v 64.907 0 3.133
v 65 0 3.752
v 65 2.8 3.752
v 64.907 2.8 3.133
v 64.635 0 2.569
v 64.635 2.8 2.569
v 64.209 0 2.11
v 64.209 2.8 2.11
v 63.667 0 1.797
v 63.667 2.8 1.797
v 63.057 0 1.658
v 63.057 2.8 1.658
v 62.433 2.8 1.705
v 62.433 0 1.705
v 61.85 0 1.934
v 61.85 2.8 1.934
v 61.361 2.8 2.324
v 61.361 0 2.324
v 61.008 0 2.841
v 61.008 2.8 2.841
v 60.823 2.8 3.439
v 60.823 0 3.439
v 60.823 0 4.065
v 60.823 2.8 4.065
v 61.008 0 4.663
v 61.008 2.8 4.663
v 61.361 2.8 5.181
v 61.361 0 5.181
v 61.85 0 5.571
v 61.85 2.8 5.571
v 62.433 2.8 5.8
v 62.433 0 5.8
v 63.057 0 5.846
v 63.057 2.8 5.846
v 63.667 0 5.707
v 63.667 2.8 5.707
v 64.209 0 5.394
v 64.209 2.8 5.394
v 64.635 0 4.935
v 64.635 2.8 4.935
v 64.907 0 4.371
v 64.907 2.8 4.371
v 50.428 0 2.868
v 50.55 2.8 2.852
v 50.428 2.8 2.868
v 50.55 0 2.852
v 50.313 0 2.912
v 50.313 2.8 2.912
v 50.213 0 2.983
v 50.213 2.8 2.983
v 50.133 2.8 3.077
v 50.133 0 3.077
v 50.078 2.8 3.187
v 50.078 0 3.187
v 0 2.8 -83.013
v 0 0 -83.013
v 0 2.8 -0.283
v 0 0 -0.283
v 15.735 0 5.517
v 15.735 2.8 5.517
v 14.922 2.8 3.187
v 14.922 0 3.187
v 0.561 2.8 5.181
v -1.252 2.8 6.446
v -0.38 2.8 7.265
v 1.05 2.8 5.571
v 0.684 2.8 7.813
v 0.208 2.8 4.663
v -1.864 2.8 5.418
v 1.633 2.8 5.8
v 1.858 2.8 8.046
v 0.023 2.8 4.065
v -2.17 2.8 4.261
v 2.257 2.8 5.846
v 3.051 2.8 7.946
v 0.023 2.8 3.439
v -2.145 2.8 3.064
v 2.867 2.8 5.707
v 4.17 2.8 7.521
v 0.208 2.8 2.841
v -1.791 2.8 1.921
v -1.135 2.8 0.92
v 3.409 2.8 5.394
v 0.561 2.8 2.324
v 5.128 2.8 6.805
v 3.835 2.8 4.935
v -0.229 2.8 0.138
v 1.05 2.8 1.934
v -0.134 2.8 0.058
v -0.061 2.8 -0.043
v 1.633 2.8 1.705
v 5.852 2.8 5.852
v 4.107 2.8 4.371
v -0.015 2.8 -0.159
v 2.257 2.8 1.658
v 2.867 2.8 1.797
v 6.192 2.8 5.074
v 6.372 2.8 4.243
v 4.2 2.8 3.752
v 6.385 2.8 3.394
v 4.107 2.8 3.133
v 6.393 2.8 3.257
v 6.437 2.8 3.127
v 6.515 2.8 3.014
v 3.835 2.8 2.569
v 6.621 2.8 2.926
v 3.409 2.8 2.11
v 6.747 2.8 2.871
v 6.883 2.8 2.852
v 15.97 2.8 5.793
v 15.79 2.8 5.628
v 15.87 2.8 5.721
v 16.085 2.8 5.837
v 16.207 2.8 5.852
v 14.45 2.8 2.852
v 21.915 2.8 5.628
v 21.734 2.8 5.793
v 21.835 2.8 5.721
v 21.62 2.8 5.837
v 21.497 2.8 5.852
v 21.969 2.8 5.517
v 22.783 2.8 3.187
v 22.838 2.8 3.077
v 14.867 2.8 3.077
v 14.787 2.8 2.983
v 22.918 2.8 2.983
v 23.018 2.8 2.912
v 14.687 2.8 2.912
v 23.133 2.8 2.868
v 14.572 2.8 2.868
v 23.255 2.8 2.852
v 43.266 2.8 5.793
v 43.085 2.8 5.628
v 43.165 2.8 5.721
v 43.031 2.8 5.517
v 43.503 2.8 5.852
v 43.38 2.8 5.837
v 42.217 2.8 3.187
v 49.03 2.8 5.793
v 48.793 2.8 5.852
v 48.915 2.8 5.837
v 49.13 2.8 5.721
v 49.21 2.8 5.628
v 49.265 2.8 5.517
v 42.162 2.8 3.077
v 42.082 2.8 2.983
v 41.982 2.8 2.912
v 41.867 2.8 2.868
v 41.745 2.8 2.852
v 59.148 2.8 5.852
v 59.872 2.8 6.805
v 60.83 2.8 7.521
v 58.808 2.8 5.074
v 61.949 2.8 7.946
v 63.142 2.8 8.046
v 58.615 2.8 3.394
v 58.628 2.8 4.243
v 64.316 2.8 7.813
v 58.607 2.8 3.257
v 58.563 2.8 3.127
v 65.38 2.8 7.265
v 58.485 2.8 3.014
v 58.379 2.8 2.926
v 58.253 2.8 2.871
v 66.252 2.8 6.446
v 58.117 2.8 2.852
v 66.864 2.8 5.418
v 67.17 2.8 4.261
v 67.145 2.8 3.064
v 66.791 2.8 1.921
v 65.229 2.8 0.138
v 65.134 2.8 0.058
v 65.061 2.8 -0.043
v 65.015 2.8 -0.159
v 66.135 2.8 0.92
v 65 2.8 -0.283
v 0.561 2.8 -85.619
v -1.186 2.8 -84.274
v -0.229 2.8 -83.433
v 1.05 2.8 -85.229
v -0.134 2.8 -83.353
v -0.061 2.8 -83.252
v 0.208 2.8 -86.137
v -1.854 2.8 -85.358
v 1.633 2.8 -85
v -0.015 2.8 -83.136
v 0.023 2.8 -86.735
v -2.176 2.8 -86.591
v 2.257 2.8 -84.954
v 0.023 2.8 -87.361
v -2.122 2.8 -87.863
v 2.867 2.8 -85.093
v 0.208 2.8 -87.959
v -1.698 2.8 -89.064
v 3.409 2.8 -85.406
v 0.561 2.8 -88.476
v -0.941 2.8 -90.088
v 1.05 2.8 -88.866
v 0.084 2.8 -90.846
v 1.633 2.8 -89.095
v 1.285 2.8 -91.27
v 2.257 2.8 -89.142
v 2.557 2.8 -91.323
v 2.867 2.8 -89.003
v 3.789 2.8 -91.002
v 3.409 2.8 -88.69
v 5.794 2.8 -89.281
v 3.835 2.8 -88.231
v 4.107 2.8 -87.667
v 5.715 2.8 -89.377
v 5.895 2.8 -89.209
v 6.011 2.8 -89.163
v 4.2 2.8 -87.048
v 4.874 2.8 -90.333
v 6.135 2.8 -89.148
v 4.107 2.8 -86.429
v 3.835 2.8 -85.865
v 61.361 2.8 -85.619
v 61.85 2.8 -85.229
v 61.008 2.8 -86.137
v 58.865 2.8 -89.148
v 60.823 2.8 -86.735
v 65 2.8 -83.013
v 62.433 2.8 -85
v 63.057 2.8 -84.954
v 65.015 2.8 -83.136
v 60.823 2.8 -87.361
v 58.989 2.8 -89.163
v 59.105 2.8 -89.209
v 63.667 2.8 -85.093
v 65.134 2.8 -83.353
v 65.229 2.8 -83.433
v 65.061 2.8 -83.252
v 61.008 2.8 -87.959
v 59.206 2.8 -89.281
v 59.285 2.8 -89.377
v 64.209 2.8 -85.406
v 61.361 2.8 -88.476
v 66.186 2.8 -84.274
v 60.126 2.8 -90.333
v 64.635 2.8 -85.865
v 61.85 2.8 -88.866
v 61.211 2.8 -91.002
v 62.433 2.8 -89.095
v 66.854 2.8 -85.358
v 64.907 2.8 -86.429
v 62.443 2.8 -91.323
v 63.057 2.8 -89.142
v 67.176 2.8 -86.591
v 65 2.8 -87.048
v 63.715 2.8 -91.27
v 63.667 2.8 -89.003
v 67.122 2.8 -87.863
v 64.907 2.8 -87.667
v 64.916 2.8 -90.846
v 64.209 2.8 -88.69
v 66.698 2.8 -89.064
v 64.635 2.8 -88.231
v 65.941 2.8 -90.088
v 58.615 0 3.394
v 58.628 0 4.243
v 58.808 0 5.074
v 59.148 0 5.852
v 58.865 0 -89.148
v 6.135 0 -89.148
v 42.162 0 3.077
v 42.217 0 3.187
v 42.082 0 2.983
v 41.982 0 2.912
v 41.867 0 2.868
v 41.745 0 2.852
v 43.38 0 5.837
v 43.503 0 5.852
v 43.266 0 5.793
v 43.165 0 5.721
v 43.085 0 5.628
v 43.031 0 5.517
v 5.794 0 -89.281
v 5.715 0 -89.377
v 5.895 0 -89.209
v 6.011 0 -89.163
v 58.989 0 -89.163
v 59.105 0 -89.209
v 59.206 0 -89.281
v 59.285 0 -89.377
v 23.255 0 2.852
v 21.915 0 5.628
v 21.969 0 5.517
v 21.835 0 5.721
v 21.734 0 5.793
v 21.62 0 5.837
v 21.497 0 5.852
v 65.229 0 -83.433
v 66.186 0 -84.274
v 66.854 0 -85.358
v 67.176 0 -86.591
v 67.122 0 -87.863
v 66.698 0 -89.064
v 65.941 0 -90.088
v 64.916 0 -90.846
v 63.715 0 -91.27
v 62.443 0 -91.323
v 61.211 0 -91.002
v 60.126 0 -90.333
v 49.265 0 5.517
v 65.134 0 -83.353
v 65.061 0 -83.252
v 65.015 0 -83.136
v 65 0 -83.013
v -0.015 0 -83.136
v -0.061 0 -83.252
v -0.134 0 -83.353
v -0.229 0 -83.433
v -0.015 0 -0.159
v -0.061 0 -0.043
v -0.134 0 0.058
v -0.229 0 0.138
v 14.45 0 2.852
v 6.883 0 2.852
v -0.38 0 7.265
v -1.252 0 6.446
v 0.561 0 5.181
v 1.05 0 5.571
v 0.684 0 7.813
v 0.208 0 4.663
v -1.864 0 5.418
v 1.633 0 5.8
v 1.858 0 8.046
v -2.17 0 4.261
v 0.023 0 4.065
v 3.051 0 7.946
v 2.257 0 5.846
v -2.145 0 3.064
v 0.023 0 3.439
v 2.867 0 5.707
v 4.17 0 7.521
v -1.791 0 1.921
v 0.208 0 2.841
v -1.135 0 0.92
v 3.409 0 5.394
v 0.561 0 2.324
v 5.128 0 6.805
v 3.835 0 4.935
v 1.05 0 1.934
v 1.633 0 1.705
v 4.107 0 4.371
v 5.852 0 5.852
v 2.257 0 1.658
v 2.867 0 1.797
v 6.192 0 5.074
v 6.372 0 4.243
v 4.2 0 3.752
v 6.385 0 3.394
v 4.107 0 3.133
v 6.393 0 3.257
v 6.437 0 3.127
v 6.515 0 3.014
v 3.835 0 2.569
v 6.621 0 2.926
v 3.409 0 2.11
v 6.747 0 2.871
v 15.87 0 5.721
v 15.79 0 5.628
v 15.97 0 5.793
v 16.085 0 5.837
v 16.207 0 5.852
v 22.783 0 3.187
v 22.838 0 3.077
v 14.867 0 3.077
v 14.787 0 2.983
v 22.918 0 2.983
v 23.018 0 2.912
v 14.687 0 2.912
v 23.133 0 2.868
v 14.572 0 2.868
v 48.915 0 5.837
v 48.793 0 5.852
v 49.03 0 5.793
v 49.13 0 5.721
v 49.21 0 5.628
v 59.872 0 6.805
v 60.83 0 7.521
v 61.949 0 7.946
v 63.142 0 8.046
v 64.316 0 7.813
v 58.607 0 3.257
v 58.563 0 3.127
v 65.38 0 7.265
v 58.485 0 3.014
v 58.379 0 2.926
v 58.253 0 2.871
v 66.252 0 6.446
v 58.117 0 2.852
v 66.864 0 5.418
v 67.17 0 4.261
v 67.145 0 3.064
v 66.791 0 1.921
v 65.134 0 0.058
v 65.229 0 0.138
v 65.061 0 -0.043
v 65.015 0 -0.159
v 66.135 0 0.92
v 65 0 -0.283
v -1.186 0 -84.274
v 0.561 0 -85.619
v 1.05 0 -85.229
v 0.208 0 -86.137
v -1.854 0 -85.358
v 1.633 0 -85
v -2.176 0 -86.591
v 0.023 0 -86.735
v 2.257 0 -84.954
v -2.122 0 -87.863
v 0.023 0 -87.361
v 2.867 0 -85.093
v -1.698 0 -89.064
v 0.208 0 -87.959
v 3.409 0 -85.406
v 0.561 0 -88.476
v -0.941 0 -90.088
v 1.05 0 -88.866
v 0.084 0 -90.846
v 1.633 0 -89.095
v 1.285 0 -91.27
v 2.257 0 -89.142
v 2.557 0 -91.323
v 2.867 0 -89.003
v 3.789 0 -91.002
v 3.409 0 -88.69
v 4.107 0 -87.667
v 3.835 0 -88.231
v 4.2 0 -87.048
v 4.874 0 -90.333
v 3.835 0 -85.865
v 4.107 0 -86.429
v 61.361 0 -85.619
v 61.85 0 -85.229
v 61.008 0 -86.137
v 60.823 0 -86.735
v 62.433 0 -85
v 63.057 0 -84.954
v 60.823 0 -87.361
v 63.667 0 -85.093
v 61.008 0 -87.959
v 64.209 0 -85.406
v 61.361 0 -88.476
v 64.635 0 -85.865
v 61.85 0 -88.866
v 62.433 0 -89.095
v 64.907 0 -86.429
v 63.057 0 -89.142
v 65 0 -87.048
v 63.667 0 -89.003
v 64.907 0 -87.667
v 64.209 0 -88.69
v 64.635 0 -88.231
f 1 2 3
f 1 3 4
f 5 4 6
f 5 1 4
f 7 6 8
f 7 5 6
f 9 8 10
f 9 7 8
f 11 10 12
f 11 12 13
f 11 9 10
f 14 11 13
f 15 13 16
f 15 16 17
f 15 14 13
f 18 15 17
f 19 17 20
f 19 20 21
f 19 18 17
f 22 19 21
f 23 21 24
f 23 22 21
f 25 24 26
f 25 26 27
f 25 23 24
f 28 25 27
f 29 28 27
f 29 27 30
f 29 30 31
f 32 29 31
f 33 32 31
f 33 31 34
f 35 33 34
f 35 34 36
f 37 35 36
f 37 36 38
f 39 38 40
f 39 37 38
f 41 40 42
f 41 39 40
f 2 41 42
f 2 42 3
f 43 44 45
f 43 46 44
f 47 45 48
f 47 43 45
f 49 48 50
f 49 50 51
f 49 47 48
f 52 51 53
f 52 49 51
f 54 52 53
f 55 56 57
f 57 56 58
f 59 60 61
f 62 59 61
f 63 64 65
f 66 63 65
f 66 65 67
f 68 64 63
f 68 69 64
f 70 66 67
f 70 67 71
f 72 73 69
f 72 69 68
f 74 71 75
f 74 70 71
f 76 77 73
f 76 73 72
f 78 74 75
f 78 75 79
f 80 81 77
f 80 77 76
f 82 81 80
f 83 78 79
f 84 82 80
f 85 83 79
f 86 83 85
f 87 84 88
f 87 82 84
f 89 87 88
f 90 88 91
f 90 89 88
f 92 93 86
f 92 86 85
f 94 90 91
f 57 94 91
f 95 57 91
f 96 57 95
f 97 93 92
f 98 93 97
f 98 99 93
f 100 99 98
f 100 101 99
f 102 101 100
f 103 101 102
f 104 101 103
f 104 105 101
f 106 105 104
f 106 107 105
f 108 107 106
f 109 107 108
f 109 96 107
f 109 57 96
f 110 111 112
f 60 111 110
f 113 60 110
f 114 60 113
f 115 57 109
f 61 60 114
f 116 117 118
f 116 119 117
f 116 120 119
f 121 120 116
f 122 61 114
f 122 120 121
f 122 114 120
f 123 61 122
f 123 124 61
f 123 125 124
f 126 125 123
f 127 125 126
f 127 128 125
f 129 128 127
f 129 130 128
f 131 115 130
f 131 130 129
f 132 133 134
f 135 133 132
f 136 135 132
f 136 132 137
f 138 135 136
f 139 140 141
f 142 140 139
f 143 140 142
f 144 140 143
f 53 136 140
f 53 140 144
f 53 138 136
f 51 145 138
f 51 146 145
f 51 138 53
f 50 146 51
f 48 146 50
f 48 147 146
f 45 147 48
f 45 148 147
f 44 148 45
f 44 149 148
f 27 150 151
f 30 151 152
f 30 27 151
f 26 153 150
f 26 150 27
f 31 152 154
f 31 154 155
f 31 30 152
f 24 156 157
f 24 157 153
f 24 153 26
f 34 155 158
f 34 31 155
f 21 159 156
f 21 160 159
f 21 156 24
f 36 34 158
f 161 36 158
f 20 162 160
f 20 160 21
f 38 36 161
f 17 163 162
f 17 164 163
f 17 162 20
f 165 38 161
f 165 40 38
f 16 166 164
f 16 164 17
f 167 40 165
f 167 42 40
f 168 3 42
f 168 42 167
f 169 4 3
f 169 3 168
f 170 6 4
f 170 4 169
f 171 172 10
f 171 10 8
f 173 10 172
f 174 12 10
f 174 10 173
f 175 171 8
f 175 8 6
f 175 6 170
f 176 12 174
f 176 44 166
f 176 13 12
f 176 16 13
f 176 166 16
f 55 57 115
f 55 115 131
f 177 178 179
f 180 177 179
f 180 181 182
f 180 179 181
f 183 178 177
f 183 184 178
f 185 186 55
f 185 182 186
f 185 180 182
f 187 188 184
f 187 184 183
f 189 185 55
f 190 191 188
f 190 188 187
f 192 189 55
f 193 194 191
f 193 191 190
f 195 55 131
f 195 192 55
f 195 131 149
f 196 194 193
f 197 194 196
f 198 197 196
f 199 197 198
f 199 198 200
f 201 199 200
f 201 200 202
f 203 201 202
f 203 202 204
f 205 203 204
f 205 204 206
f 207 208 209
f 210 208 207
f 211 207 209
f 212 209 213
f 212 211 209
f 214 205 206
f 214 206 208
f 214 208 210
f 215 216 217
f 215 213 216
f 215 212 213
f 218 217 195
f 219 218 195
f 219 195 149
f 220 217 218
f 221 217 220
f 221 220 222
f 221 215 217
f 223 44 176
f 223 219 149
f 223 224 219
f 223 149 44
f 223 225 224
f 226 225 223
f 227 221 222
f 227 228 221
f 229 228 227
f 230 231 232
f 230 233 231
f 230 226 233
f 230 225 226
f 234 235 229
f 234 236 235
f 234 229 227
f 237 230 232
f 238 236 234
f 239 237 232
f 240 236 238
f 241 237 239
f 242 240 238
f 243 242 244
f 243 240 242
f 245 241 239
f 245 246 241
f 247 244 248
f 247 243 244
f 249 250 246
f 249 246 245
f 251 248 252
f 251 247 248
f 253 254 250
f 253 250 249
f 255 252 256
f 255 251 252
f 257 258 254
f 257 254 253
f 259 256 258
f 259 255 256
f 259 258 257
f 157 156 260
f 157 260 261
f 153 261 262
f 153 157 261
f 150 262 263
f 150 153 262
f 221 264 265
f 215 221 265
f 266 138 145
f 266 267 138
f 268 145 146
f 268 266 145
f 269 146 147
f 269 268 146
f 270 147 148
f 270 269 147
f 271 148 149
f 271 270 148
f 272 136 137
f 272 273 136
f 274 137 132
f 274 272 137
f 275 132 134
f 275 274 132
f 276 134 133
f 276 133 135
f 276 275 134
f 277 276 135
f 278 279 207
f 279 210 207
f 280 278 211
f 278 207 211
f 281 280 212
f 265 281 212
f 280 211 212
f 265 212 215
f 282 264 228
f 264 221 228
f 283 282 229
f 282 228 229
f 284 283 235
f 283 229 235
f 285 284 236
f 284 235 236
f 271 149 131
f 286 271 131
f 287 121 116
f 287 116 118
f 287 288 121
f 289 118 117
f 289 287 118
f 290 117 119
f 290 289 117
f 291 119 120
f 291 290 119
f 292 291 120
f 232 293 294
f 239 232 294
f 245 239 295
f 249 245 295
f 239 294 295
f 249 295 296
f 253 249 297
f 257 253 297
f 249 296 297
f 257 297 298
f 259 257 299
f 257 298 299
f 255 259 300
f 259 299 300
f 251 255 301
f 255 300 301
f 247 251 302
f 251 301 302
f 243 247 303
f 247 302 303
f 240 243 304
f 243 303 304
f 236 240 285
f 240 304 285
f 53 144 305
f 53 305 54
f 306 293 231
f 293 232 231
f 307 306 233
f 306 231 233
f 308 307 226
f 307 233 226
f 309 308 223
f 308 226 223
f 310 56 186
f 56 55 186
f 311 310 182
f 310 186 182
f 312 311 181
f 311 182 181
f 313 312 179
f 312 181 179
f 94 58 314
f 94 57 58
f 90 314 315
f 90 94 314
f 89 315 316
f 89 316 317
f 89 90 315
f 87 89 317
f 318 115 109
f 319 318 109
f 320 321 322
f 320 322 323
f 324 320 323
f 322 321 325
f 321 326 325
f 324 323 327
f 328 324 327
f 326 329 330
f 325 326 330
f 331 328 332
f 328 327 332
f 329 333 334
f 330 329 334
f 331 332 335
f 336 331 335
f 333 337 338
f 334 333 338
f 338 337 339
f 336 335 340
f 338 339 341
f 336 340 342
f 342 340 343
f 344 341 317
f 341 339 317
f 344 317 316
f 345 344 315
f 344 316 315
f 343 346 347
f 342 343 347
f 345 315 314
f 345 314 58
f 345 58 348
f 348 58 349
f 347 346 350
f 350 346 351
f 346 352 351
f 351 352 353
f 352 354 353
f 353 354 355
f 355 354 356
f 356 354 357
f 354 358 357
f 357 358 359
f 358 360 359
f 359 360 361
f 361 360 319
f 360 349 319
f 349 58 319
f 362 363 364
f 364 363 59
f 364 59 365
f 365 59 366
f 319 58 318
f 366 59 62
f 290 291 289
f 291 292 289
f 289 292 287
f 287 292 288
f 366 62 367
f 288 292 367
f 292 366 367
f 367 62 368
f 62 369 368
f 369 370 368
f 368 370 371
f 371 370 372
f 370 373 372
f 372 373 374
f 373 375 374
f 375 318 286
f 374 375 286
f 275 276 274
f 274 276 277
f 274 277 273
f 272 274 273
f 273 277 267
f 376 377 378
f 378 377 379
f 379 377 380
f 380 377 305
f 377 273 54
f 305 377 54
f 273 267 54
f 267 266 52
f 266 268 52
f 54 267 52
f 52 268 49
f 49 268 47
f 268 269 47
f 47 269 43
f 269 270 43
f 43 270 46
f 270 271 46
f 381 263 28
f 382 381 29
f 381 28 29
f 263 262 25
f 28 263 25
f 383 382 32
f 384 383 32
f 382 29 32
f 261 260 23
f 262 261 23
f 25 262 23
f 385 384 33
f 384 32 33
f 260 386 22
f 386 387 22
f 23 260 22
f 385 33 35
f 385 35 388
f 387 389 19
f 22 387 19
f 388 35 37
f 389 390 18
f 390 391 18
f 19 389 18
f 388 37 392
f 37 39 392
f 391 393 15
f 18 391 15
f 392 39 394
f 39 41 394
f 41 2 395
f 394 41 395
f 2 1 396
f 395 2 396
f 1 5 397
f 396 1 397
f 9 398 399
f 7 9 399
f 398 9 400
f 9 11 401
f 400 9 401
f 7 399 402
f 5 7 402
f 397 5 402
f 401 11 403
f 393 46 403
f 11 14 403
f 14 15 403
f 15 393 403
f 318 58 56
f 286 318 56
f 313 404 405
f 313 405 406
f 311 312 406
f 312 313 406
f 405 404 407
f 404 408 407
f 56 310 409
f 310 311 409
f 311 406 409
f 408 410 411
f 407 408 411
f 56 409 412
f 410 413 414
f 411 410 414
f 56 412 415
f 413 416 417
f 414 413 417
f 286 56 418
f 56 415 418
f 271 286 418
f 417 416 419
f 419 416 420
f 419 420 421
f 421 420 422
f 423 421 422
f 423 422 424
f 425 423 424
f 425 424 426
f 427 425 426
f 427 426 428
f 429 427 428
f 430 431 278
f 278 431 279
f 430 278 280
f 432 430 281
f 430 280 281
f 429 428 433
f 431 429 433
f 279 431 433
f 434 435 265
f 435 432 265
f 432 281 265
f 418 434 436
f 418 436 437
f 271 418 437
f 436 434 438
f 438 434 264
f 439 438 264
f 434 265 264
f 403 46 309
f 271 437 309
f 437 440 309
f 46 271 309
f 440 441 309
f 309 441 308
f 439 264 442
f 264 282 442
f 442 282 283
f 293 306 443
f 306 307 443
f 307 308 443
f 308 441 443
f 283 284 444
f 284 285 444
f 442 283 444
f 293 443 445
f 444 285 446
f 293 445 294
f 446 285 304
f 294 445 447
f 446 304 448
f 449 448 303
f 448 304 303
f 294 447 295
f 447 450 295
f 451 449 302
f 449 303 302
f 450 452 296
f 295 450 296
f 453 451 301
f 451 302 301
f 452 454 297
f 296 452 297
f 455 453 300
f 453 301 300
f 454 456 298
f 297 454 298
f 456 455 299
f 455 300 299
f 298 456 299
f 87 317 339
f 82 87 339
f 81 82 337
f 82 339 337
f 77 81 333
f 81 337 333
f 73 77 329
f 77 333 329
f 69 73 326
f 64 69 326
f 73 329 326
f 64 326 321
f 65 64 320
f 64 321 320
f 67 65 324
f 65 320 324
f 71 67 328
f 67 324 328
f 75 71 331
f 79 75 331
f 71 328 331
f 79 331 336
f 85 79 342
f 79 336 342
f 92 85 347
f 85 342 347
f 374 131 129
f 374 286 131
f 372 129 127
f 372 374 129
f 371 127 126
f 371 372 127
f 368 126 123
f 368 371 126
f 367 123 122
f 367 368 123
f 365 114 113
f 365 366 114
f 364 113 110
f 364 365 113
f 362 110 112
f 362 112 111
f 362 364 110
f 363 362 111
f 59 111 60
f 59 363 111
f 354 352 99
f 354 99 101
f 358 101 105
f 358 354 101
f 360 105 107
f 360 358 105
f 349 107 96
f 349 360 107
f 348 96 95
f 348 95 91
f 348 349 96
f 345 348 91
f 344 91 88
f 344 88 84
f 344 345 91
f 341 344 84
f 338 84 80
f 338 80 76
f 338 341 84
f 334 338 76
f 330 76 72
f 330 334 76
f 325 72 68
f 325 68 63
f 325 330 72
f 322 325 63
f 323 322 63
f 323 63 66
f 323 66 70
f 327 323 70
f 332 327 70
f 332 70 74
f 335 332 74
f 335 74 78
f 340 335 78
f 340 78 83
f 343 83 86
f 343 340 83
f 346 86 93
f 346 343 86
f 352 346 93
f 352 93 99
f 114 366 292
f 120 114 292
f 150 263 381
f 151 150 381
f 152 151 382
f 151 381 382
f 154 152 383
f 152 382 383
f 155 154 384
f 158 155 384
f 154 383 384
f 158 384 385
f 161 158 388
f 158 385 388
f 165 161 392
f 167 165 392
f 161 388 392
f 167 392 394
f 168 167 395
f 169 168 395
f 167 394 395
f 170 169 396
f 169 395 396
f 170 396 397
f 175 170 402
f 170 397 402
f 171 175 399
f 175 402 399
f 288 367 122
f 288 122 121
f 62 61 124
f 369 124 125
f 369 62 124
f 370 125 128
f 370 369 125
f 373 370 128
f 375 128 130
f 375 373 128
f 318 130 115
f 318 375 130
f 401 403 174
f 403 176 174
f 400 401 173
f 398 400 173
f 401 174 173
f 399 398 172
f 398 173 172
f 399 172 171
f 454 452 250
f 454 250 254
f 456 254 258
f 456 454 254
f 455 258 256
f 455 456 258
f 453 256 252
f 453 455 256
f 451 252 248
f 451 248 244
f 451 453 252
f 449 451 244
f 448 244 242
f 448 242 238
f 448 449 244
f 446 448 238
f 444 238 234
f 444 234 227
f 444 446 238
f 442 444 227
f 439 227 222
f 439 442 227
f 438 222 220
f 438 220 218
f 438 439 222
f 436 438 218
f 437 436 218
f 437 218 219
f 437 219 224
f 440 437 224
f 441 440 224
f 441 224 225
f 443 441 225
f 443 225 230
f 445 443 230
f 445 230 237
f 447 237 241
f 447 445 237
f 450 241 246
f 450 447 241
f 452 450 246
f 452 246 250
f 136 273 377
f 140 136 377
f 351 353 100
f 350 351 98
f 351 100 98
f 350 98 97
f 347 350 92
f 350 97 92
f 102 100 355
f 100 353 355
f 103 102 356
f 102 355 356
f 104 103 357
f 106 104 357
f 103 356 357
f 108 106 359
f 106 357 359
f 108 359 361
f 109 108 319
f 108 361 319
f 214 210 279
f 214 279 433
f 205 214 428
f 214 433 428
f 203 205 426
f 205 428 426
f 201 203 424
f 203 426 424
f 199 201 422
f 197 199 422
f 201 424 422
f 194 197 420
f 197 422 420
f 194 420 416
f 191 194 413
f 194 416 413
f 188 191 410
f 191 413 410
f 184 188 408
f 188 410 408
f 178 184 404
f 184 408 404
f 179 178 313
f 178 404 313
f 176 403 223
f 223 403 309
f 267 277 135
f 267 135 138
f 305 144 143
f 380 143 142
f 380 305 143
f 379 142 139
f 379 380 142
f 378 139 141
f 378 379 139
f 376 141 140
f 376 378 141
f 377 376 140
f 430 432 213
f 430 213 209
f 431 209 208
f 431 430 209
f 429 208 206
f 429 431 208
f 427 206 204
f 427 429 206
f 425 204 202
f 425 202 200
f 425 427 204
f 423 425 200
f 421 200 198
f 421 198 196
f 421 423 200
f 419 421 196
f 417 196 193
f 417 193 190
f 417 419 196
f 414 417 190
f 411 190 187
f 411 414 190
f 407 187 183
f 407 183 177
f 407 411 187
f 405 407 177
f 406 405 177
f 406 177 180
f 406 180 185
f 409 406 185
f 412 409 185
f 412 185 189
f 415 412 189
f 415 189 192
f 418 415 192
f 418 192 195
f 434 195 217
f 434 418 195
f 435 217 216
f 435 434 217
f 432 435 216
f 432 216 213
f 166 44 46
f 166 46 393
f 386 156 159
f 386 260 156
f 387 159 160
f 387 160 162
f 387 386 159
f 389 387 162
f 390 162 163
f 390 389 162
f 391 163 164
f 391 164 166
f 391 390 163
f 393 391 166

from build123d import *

# Parameters (mm, degrees)
SKETCH1_R           = 2.1
BOSS_EXTRUDE1_DEPTH = 2.8
CUT_EXTRUDE1_REACH  = 4.8
FILLET1_R           = 0.5


with BuildPart() as part:
    # Sketch1 → Boss-Extrude1 (new body)
    with BuildSketch(Plane(origin=(0, 0, 0), x_dir=(1, 0, 0), z_dir=(0, 1, 0))):
        with BuildLine():
            Line((0, 83.295334784), (0, 0))
            ThreePointArc((0, 0), (-0.940559159, -6.792891767), (5.852332608, -5.852332608))
            Line((5.852332608, -5.852332608), (59.147667392, -5.852332608))
            ThreePointArc((59.147667392, -5.852332608), (65.940559159, -6.792891767), (65, 0))
            Line((65, 0), (65, 83.295334784))
            ThreePointArc((65, 83.295334784), (65.940559159, 90.088226551), (59.147667392, 89.147667392))
            Line((59.147667392, 89.147667392), (5.852332608, 89.147667392))
            ThreePointArc((5.852332608, 89.147667392), (-0.940559159, 90.088226551), (0, 83.295334784))
        make_face()
        with Locations((2.1, 87.047667392)):
            Circle(SKETCH1_R, mode=Mode.SUBTRACT)
        with Locations((2.1, -3.752332608)):
            Circle(SKETCH1_R, mode=Mode.SUBTRACT)
        with Locations((62.9, -3.752332608)):
            Circle(SKETCH1_R, mode=Mode.SUBTRACT)
        with Locations((62.9, 87.047667392)):
            Circle(SKETCH1_R, mode=Mode.SUBTRACT)
    extrude(amount=BOSS_EXTRUDE1_DEPTH)

    # Sketch2 → Cut-Extrude1 (cut, up to next)
    with BuildSketch(Plane(origin=(0, 2.8, 0), x_dir=(1, 0, 0), z_dir=(0, 1, 0)), mode=Mode.PRIVATE) as cut_extrude1_sk1:
        Polygon((22.9, -2.852332608), (21.852379604, -5.852332608), (43.147620396, -5.852332608), (42.1, -2.852332608), align=None)
    cut_extrude1_tool1 = extrude(cut_extrude1_sk1.sketch, amount=-CUT_EXTRUDE1_REACH, mode=Mode.PRIVATE) & part.part
    add(cut_extrude1_tool1.solids().sort_by_distance((32.5, 2.8, 4.378203))[0], mode=Mode.SUBTRACT)
    # Sketch2 → Cut-Extrude1 (cut, up to next)
    with BuildSketch(Plane(origin=(0, 2.8, 0), x_dir=(1, 0, 0), z_dir=(0, 1, 0)), mode=Mode.PRIVATE) as cut_extrude1_sk2:
        with BuildLine():
            Line((15.852379604, -5.852332608), (14.804759208, -2.852332608))
            Line((14.804759208, -2.852332608), (6.304759208, -2.852332608))
            ThreePointArc((6.304759208, -2.852332608), (6.351920453, -4.393559913), (5.852332608, -5.852332608))
            Line((5.852332608, -5.852332608), (15.852379604, -5.852332608))
        make_face()
    cut_extrude1_tool2 = extrude(cut_extrude1_sk2.sketch, amount=-CUT_EXTRUDE1_REACH, mode=Mode.PRIVATE) & part.part
    add(cut_extrude1_tool2.solids().sort_by_distance((10.801148, 2.8, 4.393371))[0], mode=Mode.SUBTRACT)
    # Sketch2 → Cut-Extrude1 (cut, up to next)
    with BuildSketch(Plane(origin=(0, 2.8, 0), x_dir=(1, 0, 0), z_dir=(0, 1, 0)), mode=Mode.PRIVATE) as cut_extrude1_sk3:
        with BuildLine():
            Line((59.147667392, -5.852332608), (49.147620396, -5.852332608))
            Line((49.147620396, -5.852332608), (50.195240792, -2.852332608))
            Line((50.195240792, -2.852332608), (58.695240792, -2.852332608))
            ThreePointArc((58.695240792, -2.852332608), (58.648079547, -4.393559913), (59.147667392, -5.852332608))
        make_face()
    cut_extrude1_tool3 = extrude(cut_extrude1_sk3.sketch, amount=-CUT_EXTRUDE1_REACH, mode=Mode.PRIVATE) & part.part
    add(cut_extrude1_tool3.solids().sort_by_distance((54.198852, 2.8, 4.393371))[0], mode=Mode.SUBTRACT)

    # Fillet1
    fillet1_edges = [part.edges().sort_by_distance(p)[0] for p in [
        (5.852332608, 1.4, -89.147667392),
        (59.147667392, 1.4, -89.147667392),
        (65, 1.4, -83.295334784),
        (65, 1.4, 0),
        (0, 1.4, 0),
        (0, 1.4, -83.295334784),
        (58.695240792, 1.4, 2.852332608),
        (49.147620396, 1.4, 5.852332608),
        (50.195240792, 1.4, 2.852332608),
        (15.852379604, 1.4, 5.852332608),
        (6.304759208, 1.4, 2.852332608),
        (14.804759208, 1.4, 2.852332608),
        (22.9, 1.4, 2.852332608),
        (42.1, 1.4, 2.852332608),
        (43.147620396, 1.4, 5.852332608),
        (21.852379604, 1.4, 5.852332608),
    ]]
    fillet(fillet1_edges, radius=FILLET1_R)


solid = part.part
